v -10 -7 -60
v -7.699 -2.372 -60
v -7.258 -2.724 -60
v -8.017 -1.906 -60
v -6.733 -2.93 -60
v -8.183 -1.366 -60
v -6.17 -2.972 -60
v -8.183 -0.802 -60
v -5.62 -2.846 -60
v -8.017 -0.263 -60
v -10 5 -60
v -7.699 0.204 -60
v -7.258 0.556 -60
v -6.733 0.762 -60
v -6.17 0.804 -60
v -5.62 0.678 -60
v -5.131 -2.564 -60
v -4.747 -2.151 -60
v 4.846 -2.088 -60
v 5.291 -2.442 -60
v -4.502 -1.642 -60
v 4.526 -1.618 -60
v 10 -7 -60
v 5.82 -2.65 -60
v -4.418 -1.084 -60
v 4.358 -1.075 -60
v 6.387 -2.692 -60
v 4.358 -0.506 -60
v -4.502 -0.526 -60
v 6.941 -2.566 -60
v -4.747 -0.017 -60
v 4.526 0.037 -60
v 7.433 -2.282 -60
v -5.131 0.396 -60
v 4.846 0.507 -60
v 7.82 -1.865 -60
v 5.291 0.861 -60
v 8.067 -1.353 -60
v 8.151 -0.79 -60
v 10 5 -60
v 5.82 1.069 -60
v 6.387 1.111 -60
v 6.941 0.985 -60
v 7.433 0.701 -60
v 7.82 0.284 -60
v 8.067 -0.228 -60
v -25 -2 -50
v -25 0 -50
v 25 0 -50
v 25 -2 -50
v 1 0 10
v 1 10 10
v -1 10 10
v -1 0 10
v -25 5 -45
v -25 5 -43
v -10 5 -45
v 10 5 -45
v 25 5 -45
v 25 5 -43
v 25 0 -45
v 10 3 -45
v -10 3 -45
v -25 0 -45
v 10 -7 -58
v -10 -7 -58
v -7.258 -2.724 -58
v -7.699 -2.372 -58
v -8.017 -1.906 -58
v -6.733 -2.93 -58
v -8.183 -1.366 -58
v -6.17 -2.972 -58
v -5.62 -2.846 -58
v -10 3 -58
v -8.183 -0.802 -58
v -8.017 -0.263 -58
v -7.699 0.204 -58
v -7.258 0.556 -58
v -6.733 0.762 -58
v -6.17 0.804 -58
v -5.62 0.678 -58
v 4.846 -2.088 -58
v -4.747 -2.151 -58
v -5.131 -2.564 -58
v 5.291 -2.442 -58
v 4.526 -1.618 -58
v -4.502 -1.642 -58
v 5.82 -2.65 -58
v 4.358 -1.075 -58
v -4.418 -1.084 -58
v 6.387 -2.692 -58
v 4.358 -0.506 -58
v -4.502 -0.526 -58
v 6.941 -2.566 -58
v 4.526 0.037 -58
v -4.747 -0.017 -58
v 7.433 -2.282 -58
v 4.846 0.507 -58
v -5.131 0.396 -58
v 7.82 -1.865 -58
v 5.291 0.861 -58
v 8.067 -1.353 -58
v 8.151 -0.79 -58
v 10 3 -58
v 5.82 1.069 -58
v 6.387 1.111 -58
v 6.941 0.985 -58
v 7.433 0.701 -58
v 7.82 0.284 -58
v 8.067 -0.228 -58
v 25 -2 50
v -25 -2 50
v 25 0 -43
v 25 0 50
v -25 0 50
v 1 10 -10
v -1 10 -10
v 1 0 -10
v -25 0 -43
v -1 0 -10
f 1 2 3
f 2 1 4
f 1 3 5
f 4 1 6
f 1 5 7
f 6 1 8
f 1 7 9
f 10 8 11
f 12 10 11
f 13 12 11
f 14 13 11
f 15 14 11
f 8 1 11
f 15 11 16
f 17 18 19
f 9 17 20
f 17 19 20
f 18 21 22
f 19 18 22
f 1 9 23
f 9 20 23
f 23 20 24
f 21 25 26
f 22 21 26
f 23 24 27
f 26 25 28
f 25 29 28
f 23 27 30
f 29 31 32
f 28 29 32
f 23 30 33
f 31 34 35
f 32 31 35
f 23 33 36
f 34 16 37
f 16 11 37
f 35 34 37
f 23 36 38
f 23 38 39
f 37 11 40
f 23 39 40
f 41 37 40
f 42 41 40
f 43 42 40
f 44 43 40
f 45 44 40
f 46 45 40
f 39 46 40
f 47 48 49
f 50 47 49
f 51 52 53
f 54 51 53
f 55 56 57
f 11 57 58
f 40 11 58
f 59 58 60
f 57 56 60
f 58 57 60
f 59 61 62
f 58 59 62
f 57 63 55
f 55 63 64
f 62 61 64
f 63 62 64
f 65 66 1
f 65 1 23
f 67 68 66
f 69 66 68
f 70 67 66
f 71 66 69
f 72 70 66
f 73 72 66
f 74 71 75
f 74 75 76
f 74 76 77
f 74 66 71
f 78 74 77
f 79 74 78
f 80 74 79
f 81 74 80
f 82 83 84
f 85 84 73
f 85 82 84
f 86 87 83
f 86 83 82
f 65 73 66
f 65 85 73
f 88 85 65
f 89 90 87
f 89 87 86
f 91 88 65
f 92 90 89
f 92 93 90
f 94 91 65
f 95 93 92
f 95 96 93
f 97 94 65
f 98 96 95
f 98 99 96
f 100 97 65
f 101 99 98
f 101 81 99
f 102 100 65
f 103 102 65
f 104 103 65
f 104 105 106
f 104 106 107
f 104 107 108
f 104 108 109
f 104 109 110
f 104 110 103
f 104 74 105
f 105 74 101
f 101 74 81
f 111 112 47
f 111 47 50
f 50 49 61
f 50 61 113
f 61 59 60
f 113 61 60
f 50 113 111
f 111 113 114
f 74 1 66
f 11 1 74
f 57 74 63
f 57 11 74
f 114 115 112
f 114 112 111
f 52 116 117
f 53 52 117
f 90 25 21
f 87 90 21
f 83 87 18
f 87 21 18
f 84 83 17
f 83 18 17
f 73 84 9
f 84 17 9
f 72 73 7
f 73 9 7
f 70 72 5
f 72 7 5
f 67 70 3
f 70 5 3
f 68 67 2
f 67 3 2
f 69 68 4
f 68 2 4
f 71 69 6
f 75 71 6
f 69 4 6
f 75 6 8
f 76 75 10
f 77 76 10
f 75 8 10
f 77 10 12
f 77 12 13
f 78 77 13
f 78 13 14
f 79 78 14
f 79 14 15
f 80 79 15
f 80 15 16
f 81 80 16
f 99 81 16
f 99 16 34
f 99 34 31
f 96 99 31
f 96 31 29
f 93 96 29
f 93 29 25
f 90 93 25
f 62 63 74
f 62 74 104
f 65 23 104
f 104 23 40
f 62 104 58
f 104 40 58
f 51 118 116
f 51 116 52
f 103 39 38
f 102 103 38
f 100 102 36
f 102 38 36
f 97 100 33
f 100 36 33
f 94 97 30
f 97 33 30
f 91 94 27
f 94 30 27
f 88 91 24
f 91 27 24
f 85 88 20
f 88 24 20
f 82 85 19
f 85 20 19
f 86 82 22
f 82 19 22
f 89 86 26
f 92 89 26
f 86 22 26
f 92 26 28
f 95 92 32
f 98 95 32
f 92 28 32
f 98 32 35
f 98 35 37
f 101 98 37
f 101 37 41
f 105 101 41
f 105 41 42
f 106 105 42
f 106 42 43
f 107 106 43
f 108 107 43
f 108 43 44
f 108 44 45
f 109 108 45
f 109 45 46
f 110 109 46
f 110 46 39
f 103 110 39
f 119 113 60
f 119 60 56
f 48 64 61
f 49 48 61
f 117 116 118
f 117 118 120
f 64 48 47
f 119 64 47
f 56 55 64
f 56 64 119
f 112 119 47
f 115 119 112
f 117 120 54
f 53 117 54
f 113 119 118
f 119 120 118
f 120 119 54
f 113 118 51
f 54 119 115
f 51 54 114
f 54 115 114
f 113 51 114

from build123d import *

# Parameters (mm, degrees)
F0_W      = 50
F0_H      = 100
F1_DEPTH  = 2
F2_W      = 50
F2_H      = 2
F3_DEPTH  = 5
F4_W      = 10
F4_H      = 2
F5_DEPTH  = 15
F6_W      = 10
F6_H      = 2
F7_DEPTH  = 15
F8_W      = 20
F8_H      = 2
F9_DEPTH  = 10
F10_R     = 1.893356
F11_DEPTH = 3
F12_R     = 1.90716
F13_DEPTH = 3
F14_W     = 2
F14_H     = 20
F15_DEPTH = 10


with BuildPart() as f1:
    # F0 (on Front) → F1 (new body)
    with BuildSketch(Plane.XZ):
        Rectangle(F0_W, F0_H)
    extrude(amount=F1_DEPTH)

    # F2 (on face) → F3 (join)
    with BuildSketch(Plane(origin=(0, 0, 0), x_dir=(-1, 0, 0), z_dir=(0, 1, 0))):
        with Locations((0, -44)):
            Rectangle(F2_W, F2_H)
    extrude(amount=F3_DEPTH)

    # F4 (on face) → F5 (join)
    with BuildSketch(Plane(origin=(0, 0, -45), x_dir=(1, 0, 0), z_dir=(0, 0, -1))):
        with Locations((5, -4)):
            Rectangle(F4_W, F4_H)
    extrude(amount=F5_DEPTH)

    # F6 (on face) → F7 (join)
    with BuildSketch(Plane(origin=(0, 0, -45), x_dir=(1, 0, 0), z_dir=(0, 0, -1))):
        with Locations((-5, -4)):
            Rectangle(F6_W, F6_H)
    extrude(amount=F7_DEPTH)

    # F8 (on face) → F9 (join)
    with BuildSketch(Plane.XZ.offset(-3)):
        with Locations((0, -59)):
            Rectangle(F8_W, F8_H)
    extrude(amount=F9_DEPTH)

    # F10 (on face) → F11 (cut)
    with BuildSketch(Plane(origin=(0, 0, -60), x_dir=(1, 0, 0), z_dir=(0, 0, -1))):
        with Locations((-6.311274, 1.08402)):
            Circle(F10_R)
    extrude(amount=-F11_DEPTH, mode=Mode.SUBTRACT)

    # F12 (on face) → F13 (cut)
    with BuildSketch(Plane(origin=(0, 0, -60), x_dir=(1, 0, 0), z_dir=(0, 0, -1))):
        with Locations((6.244087, 0.790448)):
            Circle(F12_R)
    extrude(amount=-F13_DEPTH, mode=Mode.SUBTRACT)

    # F14 (on face) → F15 (join)
    with BuildSketch(Plane(origin=(0, 0, 0), x_dir=(-1, 0, 0), z_dir=(0, 1, 0))):
        Rectangle(F14_W, F14_H)
    extrude(amount=F15_DEPTH)


solid = f1.part
